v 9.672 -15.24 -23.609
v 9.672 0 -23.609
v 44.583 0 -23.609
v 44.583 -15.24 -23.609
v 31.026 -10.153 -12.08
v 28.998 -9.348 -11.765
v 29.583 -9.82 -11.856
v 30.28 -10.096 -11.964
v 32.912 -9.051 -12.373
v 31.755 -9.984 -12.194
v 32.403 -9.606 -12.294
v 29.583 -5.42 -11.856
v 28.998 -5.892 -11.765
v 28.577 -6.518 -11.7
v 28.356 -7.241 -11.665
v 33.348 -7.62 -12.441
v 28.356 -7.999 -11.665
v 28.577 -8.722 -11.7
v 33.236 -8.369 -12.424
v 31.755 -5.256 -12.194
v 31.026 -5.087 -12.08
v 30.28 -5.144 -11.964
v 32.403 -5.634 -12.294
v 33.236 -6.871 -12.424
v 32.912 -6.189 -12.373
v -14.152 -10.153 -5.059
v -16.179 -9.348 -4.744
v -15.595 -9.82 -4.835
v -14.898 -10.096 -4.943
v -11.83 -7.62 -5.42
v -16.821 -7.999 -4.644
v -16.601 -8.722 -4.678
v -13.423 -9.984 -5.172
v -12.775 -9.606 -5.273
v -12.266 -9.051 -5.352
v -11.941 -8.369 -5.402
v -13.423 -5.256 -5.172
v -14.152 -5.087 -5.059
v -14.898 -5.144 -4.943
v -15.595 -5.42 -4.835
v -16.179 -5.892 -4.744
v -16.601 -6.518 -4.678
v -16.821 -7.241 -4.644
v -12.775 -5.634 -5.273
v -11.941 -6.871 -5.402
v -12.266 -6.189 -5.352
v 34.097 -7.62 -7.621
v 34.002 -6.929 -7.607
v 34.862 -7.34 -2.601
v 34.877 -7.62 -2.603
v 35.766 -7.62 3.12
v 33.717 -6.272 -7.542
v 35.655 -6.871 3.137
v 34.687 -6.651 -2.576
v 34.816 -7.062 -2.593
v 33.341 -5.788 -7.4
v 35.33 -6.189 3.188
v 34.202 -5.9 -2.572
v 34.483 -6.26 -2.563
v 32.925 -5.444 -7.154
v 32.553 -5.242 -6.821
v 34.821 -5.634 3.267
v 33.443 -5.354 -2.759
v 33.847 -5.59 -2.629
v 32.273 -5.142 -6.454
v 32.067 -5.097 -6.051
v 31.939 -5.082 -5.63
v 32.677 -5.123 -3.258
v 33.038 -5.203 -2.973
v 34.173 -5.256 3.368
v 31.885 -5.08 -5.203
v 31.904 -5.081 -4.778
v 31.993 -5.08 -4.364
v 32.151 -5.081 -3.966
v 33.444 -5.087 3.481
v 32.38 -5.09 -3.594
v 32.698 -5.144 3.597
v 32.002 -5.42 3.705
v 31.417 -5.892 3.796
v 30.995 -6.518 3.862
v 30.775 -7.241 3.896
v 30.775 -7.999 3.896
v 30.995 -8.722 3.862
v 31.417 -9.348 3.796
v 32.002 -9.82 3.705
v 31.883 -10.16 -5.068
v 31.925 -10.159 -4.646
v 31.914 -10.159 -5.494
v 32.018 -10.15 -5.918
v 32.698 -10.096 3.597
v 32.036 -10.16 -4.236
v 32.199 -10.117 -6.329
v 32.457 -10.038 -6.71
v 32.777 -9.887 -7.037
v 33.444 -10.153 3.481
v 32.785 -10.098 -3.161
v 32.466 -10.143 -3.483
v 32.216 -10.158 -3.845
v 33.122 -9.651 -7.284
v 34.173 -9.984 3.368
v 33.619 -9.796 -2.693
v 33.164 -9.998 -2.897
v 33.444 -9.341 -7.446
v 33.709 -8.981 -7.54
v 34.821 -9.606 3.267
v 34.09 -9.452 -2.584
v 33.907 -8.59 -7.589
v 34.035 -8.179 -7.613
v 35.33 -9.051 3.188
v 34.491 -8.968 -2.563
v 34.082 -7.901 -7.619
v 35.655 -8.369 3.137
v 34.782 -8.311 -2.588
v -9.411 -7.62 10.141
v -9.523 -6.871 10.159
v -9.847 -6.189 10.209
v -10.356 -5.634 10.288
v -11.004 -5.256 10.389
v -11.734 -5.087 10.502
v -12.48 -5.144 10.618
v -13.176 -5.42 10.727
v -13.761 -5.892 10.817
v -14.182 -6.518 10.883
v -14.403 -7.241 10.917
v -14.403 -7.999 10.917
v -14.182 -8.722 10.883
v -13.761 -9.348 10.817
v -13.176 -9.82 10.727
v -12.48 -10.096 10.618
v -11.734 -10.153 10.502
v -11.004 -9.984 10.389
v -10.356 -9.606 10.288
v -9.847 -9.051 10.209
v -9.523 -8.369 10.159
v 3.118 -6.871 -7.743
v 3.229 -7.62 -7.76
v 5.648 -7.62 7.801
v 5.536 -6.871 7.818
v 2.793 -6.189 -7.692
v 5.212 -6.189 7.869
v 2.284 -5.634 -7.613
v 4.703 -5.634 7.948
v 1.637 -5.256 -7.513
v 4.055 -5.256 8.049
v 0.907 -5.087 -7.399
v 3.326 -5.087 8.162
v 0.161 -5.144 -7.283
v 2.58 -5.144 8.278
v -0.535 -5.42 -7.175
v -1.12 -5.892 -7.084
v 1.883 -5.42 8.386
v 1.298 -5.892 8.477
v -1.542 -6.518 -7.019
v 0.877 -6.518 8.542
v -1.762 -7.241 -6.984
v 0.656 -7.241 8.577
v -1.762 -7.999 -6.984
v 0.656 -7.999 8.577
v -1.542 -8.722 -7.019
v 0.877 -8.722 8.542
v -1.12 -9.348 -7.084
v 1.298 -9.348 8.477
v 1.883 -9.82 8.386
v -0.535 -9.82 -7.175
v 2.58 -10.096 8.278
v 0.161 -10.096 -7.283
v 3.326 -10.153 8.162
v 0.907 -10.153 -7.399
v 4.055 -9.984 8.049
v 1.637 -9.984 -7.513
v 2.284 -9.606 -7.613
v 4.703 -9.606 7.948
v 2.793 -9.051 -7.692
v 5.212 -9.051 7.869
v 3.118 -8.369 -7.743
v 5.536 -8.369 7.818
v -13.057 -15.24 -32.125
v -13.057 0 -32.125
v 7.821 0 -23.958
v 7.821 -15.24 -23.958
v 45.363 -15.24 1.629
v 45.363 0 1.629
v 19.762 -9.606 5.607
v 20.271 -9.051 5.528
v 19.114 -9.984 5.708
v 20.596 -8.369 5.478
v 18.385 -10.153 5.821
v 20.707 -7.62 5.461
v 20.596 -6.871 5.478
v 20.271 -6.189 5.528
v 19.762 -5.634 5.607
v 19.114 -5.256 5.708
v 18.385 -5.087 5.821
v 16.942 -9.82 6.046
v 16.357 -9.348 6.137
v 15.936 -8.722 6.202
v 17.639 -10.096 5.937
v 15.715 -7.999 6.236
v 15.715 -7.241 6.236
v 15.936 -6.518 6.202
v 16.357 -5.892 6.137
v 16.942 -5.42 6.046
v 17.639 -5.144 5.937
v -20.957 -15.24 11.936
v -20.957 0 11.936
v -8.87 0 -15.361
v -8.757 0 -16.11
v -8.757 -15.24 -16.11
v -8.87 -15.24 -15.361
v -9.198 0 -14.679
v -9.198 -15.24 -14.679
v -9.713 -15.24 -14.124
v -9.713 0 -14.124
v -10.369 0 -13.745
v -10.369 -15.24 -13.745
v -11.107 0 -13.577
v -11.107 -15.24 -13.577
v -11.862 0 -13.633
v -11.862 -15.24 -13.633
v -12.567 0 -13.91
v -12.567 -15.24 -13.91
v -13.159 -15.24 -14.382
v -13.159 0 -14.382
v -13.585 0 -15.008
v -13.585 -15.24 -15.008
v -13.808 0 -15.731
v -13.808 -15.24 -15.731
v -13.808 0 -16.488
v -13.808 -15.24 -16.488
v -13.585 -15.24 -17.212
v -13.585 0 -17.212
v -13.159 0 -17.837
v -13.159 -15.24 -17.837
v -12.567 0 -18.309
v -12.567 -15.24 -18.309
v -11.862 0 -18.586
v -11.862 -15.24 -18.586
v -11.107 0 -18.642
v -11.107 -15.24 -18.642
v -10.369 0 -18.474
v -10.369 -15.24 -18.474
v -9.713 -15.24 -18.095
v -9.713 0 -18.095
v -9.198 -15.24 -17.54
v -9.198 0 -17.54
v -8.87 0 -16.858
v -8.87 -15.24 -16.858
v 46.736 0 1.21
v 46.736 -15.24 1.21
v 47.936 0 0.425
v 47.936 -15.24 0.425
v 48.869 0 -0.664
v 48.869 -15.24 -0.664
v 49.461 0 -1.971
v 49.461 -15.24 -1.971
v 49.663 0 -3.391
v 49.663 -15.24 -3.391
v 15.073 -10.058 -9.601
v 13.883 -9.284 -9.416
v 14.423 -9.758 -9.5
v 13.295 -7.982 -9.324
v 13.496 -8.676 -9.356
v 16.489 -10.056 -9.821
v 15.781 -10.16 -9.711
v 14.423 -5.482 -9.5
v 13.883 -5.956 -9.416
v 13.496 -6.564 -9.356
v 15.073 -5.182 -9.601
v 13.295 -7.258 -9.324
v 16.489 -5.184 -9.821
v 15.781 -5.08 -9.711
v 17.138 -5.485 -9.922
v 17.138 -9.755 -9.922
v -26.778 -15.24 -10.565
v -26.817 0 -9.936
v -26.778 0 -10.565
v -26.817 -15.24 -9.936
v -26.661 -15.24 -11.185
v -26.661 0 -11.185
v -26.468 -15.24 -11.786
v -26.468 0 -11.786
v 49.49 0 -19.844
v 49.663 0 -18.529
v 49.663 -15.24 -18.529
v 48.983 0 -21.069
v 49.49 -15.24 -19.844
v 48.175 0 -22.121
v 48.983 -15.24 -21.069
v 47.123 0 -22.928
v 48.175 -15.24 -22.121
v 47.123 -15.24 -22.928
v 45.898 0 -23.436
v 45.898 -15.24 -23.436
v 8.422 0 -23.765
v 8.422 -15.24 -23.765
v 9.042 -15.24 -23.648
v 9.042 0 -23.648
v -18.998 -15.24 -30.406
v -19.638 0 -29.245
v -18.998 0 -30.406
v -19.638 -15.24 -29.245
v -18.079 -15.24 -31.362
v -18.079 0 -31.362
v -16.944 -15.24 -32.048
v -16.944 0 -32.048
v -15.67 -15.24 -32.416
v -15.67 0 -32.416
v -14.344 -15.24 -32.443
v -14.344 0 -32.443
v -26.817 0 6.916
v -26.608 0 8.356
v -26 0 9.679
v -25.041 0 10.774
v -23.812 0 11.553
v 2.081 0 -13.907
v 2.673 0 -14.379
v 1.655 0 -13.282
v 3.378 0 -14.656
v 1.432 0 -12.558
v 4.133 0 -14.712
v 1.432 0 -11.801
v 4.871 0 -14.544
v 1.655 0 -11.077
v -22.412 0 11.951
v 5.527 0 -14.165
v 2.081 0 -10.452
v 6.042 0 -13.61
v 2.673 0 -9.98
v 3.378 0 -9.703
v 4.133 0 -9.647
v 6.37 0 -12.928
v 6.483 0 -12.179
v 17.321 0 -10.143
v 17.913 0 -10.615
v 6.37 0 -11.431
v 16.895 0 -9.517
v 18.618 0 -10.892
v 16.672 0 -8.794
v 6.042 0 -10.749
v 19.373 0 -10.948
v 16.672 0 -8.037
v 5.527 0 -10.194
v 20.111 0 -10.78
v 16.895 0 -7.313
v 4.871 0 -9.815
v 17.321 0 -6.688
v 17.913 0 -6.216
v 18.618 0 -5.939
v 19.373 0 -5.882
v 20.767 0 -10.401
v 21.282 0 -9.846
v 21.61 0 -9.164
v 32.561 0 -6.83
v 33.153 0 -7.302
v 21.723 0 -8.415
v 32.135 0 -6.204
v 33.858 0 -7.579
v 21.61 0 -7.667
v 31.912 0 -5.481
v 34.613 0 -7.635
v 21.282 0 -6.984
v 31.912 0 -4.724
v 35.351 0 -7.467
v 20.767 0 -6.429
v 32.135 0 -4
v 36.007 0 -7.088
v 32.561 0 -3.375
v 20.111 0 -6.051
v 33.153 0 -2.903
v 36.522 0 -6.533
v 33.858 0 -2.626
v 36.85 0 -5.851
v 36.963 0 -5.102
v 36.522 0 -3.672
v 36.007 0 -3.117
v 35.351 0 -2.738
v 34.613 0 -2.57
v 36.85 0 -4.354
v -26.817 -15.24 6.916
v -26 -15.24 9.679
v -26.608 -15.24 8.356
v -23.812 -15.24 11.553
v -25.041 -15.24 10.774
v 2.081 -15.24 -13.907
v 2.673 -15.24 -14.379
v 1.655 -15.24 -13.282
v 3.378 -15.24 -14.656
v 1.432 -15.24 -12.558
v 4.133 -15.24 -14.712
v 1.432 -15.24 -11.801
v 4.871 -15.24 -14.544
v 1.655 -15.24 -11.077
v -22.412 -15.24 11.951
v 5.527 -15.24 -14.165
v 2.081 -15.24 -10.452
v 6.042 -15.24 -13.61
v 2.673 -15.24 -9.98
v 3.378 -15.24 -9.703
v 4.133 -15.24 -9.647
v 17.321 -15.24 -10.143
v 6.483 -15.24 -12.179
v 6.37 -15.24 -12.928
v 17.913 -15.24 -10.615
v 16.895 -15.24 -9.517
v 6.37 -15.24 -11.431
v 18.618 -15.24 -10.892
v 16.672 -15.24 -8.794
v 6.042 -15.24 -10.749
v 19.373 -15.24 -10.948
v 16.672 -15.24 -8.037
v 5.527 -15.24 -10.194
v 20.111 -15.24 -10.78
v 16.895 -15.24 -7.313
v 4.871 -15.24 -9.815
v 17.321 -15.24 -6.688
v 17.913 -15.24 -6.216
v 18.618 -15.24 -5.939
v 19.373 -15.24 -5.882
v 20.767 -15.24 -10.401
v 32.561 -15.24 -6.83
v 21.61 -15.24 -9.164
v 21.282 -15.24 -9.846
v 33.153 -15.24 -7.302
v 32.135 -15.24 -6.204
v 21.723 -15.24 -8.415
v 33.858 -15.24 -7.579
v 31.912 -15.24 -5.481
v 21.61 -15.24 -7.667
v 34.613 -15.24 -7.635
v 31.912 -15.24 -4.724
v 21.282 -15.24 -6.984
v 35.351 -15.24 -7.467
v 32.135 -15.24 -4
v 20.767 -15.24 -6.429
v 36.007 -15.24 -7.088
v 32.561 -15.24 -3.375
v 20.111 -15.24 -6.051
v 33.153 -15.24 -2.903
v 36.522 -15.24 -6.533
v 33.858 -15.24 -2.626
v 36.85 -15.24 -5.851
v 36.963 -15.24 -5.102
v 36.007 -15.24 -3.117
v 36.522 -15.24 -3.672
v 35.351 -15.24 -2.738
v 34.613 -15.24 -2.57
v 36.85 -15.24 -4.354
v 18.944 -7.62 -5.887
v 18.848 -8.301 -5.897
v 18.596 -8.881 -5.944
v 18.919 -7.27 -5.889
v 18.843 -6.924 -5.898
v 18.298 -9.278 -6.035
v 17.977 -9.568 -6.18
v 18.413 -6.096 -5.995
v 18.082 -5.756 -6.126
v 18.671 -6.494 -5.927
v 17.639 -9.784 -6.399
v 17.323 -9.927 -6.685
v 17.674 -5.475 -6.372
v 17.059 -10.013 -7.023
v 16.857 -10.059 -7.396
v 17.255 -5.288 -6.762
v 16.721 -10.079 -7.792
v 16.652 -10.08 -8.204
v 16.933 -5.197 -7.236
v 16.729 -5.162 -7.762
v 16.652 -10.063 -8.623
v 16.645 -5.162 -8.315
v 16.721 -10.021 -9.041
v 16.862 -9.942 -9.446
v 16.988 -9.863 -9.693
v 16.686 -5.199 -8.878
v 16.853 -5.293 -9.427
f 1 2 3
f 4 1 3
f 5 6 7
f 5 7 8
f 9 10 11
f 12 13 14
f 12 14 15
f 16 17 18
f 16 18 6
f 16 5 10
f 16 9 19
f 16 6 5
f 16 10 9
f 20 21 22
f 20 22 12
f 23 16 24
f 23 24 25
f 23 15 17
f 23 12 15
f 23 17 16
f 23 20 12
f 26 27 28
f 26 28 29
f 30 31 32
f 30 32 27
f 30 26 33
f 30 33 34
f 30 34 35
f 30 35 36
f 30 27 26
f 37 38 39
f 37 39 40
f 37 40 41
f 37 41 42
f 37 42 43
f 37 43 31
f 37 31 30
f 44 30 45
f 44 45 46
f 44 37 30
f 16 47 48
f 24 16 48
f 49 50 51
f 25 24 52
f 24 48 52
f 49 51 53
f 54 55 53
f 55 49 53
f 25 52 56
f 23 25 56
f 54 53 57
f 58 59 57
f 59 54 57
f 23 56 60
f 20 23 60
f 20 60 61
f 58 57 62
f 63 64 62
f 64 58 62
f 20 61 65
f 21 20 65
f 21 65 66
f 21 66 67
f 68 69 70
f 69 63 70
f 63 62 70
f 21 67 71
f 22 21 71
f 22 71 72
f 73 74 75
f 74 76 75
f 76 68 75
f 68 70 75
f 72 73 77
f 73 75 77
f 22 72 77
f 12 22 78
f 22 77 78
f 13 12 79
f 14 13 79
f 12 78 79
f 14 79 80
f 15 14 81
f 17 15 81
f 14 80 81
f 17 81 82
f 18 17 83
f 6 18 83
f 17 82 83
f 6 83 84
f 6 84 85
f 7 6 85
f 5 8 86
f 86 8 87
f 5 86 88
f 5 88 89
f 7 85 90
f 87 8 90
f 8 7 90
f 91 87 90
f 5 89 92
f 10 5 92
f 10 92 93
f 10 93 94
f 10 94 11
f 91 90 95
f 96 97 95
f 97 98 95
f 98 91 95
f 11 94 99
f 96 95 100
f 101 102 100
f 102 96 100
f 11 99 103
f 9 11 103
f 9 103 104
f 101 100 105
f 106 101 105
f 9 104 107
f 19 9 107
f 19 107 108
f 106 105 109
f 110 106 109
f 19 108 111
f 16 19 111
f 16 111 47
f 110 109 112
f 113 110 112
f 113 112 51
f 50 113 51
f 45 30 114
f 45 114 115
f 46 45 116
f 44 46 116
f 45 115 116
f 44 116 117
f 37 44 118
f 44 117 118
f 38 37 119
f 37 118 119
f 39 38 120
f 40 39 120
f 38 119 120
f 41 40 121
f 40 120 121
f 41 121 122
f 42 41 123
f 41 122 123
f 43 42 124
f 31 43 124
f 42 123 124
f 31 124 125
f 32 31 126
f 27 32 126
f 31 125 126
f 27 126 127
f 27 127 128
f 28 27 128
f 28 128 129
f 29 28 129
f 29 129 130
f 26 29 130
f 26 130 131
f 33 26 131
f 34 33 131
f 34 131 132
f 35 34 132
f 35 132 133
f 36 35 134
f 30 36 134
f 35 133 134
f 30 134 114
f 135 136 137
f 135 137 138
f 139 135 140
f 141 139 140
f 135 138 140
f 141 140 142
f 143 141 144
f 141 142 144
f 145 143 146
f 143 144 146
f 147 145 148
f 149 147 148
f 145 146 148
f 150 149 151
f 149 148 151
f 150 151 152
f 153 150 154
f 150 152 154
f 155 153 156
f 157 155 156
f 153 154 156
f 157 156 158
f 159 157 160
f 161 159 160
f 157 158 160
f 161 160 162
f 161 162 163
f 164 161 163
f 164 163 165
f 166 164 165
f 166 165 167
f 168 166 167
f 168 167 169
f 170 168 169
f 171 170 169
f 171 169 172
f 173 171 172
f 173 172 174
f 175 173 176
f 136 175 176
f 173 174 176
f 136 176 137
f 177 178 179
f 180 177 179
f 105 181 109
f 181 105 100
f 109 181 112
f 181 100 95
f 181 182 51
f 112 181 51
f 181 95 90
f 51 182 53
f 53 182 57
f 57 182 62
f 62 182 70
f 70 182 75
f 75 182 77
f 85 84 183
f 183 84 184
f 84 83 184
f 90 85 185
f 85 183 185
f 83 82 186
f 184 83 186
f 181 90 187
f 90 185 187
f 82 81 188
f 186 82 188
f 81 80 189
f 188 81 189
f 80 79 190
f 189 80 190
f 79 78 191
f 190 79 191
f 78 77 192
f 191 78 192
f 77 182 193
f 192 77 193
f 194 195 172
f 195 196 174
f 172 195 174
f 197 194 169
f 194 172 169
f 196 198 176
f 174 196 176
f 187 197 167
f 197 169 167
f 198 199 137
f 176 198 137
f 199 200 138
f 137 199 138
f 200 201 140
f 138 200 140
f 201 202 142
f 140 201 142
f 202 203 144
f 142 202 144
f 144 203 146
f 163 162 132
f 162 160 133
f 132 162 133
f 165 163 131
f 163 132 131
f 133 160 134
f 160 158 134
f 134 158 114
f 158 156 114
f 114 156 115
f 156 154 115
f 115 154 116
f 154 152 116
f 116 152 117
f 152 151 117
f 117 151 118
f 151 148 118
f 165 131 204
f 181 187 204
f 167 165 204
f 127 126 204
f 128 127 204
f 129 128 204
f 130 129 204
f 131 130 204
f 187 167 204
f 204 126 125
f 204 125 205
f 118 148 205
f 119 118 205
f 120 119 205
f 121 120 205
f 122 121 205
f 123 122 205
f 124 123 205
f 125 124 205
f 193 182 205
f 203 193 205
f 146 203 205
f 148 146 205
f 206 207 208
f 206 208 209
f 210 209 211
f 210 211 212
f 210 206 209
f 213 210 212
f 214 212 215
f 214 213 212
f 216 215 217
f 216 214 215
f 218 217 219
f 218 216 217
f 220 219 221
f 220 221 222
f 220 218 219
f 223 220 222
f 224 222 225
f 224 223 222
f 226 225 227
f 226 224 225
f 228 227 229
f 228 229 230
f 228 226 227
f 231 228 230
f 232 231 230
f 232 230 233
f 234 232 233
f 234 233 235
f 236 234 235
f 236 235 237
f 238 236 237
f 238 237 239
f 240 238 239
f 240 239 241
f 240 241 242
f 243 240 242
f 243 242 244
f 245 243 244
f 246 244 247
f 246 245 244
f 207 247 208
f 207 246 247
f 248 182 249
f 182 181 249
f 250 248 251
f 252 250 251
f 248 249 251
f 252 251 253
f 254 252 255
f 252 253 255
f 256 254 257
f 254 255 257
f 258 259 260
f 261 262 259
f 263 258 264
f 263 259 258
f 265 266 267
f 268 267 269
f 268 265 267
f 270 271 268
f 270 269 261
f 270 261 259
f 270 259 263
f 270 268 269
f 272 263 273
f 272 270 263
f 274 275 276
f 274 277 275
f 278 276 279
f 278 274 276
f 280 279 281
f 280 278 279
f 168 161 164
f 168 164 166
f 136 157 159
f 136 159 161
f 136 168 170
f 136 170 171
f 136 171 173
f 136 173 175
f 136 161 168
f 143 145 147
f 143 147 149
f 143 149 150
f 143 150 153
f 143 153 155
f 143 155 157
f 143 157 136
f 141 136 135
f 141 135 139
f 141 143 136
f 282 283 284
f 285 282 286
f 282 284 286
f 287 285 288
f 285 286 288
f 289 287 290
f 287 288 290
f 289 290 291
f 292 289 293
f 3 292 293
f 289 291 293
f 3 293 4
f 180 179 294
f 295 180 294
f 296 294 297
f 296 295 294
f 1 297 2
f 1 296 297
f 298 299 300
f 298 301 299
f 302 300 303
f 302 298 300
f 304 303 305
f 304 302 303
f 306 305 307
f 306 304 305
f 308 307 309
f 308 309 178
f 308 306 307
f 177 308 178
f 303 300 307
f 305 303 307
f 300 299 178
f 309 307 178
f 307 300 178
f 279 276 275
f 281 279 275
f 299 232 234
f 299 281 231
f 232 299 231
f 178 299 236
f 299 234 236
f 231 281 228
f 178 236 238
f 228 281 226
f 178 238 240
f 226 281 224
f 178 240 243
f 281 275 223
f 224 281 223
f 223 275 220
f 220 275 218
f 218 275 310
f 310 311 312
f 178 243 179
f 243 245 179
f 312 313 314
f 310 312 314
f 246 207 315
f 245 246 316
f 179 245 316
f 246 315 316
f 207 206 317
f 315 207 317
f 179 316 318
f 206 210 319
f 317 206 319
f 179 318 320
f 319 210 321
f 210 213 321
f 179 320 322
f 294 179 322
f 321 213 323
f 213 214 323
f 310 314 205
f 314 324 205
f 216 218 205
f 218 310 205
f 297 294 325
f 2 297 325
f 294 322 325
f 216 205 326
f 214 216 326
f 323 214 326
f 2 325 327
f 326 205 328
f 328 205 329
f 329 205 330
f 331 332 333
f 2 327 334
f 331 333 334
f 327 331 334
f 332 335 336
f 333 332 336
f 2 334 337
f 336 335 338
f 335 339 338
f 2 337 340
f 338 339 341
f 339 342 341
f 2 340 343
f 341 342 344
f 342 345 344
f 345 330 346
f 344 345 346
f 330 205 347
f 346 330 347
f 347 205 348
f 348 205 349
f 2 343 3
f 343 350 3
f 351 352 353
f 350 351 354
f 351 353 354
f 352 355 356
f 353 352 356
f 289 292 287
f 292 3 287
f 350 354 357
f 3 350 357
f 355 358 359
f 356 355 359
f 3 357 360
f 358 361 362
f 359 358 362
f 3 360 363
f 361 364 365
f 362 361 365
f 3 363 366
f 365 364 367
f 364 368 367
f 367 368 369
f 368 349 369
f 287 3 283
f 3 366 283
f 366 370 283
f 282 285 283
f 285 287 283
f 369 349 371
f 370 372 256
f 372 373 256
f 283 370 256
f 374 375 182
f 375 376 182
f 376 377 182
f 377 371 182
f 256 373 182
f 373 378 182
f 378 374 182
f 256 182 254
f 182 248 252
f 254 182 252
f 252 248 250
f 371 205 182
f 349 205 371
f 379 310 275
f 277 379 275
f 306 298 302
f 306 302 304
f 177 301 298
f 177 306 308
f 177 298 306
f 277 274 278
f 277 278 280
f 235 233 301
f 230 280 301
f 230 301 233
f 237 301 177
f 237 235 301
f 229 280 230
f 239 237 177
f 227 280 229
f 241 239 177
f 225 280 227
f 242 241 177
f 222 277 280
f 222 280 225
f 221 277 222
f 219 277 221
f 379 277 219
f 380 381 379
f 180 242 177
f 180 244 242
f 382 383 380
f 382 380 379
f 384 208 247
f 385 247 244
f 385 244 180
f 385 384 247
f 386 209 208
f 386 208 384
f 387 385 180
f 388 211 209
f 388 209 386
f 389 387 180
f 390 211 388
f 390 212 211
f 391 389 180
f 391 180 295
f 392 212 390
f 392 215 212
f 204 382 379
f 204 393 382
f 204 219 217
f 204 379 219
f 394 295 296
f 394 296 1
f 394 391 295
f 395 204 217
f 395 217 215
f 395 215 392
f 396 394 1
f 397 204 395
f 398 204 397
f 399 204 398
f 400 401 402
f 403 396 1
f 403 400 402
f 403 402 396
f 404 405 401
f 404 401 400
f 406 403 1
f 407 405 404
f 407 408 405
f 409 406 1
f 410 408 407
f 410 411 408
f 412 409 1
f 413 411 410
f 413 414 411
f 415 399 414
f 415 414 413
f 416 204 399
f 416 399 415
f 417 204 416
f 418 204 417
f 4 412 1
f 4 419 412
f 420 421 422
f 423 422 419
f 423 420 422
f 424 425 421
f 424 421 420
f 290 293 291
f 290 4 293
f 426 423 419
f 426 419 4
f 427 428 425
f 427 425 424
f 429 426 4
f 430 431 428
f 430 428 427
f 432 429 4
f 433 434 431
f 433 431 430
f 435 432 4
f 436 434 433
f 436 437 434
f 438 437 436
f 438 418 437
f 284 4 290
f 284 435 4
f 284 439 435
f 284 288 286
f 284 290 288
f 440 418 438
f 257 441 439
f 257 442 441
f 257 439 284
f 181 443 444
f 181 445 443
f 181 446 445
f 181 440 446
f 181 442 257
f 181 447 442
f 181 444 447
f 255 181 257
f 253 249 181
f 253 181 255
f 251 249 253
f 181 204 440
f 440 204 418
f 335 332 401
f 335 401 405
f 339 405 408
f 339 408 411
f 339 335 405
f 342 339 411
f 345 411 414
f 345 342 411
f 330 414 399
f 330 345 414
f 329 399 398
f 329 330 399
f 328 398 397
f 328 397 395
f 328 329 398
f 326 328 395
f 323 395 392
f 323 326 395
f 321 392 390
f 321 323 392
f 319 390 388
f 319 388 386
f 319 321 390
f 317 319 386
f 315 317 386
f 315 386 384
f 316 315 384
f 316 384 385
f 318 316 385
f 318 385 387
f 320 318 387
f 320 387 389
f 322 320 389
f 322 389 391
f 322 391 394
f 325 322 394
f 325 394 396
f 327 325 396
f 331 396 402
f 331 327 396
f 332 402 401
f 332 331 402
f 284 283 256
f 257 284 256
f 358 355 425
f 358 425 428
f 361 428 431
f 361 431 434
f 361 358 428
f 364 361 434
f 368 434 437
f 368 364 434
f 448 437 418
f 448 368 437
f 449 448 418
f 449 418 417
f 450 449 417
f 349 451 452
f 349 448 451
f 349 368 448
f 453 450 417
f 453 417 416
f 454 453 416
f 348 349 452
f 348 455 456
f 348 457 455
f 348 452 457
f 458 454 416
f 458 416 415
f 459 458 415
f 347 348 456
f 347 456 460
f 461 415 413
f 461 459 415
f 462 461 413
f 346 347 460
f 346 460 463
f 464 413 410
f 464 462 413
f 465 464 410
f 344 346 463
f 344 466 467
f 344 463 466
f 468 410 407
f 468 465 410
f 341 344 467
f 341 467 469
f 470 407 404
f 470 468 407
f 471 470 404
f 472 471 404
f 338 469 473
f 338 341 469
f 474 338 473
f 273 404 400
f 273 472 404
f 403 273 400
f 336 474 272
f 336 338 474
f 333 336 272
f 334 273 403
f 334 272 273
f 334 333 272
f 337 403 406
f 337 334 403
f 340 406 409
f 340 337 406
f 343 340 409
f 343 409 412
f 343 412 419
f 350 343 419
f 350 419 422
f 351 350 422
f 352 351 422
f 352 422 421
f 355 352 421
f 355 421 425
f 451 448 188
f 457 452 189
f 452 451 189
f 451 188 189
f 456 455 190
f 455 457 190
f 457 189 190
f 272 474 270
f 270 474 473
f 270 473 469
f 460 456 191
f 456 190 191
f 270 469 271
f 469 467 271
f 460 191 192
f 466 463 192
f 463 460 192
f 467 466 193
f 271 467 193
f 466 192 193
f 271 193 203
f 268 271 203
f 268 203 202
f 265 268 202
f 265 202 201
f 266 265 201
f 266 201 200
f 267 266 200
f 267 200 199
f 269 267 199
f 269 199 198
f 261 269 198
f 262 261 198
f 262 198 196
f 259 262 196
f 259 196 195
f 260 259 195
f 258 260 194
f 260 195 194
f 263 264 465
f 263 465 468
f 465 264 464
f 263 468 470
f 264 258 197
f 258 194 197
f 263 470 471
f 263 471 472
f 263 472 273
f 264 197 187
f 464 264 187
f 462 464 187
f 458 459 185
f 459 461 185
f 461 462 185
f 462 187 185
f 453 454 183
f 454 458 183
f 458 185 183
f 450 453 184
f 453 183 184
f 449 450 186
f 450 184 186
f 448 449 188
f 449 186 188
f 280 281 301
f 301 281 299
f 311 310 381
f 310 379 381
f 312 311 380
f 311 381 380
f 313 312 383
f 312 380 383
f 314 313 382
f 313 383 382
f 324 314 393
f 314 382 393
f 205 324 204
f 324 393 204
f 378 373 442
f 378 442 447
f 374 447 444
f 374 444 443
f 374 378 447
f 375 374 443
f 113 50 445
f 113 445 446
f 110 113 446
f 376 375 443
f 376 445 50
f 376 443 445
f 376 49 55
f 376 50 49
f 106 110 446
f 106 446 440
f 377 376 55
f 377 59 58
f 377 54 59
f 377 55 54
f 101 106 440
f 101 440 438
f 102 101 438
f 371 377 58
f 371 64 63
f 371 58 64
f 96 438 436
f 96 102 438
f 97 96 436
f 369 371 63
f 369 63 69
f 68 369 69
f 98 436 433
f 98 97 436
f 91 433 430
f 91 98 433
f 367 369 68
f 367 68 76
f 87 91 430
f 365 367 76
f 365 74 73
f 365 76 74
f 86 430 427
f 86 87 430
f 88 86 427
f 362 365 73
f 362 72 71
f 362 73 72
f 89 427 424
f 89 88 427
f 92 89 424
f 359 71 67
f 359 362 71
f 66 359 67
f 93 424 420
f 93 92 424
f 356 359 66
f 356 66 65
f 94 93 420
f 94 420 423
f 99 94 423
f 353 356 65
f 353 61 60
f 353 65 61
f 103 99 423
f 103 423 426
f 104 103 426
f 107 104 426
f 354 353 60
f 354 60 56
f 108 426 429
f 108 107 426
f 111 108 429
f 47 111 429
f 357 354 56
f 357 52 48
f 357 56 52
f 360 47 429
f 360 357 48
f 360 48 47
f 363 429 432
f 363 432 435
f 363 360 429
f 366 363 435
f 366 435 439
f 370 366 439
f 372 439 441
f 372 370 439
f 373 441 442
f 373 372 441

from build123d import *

# Parameters (mm, degrees)
F0_R     = 2.54
F1_DEPTH = 15.24
F2_R     = 5.08
F3_R     = 2.54
F4_DEPTH = 15.748


with BuildPart() as f1:
    # F0 (on Front) → F1 (new body)
    with BuildSketch(Plane.XZ):
        Polygon((-26.816706221, 12.8465024581), (-26.816706221, -10.6672204749), (-26.816706221, -10.8938248026), (-17.7876478214, -33.9755966375), (8.7138581745, -23.6088168675), (49.6632434885, -23.6088168675), (49.6632434885, 0.9602710623), align=None)
        with Locations((-11.2967565115, -16.1095818214)):
            Circle(F0_R, mode=Mode.SUBTRACT)
        with Locations((3.9432434885, -12.1794487806)):
            Circle(F0_R, mode=Mode.SUBTRACT)
        with Locations((19.1832434885, -8.4152225918)):
            Circle(F0_R, mode=Mode.SUBTRACT)
        with Locations((34.4232434885, -5.1024009119)):
            Circle(F0_R, mode=Mode.SUBTRACT)
    extrude(amount=F1_DEPTH)

    # F2
    f2_edges = [f1.edges().sort_by_distance(p)[0] for p in [
        (-26.816706, -7.62, 12.846502),
        (49.663243, -7.62, 0.960271),
        (49.663243, -7.62, -23.608817),
        (8.713858, -7.62, -23.608817),
        (-17.787648, -7.62, -33.975597),
        (-26.816706, -7.62, -10.893825),
    ]]
    fillet(f2_edges, radius=F2_R)

    # F3 (on face) → F4 (cut)
    with BuildSketch(Plane(origin=(1.3170078158, 0, 8.474064501), x_dir=(0.988137358, 0, -0.1535726597), z_dir=(0.1535726597, 0, 0.988137358))):
        with Locations((32.3229017764, -7.62)):
            Circle(F3_R)
        with Locations((17.0829017764, -7.62)):
            Circle(F3_R)
        with Locations((1.8429017764, -7.62)):
            Circle(F3_R)
        with Locations((-13.3970982236, -7.62)):
            Circle(F3_R)
    extrude(amount=-F4_DEPTH, mode=Mode.SUBTRACT)


solid = f1.part
